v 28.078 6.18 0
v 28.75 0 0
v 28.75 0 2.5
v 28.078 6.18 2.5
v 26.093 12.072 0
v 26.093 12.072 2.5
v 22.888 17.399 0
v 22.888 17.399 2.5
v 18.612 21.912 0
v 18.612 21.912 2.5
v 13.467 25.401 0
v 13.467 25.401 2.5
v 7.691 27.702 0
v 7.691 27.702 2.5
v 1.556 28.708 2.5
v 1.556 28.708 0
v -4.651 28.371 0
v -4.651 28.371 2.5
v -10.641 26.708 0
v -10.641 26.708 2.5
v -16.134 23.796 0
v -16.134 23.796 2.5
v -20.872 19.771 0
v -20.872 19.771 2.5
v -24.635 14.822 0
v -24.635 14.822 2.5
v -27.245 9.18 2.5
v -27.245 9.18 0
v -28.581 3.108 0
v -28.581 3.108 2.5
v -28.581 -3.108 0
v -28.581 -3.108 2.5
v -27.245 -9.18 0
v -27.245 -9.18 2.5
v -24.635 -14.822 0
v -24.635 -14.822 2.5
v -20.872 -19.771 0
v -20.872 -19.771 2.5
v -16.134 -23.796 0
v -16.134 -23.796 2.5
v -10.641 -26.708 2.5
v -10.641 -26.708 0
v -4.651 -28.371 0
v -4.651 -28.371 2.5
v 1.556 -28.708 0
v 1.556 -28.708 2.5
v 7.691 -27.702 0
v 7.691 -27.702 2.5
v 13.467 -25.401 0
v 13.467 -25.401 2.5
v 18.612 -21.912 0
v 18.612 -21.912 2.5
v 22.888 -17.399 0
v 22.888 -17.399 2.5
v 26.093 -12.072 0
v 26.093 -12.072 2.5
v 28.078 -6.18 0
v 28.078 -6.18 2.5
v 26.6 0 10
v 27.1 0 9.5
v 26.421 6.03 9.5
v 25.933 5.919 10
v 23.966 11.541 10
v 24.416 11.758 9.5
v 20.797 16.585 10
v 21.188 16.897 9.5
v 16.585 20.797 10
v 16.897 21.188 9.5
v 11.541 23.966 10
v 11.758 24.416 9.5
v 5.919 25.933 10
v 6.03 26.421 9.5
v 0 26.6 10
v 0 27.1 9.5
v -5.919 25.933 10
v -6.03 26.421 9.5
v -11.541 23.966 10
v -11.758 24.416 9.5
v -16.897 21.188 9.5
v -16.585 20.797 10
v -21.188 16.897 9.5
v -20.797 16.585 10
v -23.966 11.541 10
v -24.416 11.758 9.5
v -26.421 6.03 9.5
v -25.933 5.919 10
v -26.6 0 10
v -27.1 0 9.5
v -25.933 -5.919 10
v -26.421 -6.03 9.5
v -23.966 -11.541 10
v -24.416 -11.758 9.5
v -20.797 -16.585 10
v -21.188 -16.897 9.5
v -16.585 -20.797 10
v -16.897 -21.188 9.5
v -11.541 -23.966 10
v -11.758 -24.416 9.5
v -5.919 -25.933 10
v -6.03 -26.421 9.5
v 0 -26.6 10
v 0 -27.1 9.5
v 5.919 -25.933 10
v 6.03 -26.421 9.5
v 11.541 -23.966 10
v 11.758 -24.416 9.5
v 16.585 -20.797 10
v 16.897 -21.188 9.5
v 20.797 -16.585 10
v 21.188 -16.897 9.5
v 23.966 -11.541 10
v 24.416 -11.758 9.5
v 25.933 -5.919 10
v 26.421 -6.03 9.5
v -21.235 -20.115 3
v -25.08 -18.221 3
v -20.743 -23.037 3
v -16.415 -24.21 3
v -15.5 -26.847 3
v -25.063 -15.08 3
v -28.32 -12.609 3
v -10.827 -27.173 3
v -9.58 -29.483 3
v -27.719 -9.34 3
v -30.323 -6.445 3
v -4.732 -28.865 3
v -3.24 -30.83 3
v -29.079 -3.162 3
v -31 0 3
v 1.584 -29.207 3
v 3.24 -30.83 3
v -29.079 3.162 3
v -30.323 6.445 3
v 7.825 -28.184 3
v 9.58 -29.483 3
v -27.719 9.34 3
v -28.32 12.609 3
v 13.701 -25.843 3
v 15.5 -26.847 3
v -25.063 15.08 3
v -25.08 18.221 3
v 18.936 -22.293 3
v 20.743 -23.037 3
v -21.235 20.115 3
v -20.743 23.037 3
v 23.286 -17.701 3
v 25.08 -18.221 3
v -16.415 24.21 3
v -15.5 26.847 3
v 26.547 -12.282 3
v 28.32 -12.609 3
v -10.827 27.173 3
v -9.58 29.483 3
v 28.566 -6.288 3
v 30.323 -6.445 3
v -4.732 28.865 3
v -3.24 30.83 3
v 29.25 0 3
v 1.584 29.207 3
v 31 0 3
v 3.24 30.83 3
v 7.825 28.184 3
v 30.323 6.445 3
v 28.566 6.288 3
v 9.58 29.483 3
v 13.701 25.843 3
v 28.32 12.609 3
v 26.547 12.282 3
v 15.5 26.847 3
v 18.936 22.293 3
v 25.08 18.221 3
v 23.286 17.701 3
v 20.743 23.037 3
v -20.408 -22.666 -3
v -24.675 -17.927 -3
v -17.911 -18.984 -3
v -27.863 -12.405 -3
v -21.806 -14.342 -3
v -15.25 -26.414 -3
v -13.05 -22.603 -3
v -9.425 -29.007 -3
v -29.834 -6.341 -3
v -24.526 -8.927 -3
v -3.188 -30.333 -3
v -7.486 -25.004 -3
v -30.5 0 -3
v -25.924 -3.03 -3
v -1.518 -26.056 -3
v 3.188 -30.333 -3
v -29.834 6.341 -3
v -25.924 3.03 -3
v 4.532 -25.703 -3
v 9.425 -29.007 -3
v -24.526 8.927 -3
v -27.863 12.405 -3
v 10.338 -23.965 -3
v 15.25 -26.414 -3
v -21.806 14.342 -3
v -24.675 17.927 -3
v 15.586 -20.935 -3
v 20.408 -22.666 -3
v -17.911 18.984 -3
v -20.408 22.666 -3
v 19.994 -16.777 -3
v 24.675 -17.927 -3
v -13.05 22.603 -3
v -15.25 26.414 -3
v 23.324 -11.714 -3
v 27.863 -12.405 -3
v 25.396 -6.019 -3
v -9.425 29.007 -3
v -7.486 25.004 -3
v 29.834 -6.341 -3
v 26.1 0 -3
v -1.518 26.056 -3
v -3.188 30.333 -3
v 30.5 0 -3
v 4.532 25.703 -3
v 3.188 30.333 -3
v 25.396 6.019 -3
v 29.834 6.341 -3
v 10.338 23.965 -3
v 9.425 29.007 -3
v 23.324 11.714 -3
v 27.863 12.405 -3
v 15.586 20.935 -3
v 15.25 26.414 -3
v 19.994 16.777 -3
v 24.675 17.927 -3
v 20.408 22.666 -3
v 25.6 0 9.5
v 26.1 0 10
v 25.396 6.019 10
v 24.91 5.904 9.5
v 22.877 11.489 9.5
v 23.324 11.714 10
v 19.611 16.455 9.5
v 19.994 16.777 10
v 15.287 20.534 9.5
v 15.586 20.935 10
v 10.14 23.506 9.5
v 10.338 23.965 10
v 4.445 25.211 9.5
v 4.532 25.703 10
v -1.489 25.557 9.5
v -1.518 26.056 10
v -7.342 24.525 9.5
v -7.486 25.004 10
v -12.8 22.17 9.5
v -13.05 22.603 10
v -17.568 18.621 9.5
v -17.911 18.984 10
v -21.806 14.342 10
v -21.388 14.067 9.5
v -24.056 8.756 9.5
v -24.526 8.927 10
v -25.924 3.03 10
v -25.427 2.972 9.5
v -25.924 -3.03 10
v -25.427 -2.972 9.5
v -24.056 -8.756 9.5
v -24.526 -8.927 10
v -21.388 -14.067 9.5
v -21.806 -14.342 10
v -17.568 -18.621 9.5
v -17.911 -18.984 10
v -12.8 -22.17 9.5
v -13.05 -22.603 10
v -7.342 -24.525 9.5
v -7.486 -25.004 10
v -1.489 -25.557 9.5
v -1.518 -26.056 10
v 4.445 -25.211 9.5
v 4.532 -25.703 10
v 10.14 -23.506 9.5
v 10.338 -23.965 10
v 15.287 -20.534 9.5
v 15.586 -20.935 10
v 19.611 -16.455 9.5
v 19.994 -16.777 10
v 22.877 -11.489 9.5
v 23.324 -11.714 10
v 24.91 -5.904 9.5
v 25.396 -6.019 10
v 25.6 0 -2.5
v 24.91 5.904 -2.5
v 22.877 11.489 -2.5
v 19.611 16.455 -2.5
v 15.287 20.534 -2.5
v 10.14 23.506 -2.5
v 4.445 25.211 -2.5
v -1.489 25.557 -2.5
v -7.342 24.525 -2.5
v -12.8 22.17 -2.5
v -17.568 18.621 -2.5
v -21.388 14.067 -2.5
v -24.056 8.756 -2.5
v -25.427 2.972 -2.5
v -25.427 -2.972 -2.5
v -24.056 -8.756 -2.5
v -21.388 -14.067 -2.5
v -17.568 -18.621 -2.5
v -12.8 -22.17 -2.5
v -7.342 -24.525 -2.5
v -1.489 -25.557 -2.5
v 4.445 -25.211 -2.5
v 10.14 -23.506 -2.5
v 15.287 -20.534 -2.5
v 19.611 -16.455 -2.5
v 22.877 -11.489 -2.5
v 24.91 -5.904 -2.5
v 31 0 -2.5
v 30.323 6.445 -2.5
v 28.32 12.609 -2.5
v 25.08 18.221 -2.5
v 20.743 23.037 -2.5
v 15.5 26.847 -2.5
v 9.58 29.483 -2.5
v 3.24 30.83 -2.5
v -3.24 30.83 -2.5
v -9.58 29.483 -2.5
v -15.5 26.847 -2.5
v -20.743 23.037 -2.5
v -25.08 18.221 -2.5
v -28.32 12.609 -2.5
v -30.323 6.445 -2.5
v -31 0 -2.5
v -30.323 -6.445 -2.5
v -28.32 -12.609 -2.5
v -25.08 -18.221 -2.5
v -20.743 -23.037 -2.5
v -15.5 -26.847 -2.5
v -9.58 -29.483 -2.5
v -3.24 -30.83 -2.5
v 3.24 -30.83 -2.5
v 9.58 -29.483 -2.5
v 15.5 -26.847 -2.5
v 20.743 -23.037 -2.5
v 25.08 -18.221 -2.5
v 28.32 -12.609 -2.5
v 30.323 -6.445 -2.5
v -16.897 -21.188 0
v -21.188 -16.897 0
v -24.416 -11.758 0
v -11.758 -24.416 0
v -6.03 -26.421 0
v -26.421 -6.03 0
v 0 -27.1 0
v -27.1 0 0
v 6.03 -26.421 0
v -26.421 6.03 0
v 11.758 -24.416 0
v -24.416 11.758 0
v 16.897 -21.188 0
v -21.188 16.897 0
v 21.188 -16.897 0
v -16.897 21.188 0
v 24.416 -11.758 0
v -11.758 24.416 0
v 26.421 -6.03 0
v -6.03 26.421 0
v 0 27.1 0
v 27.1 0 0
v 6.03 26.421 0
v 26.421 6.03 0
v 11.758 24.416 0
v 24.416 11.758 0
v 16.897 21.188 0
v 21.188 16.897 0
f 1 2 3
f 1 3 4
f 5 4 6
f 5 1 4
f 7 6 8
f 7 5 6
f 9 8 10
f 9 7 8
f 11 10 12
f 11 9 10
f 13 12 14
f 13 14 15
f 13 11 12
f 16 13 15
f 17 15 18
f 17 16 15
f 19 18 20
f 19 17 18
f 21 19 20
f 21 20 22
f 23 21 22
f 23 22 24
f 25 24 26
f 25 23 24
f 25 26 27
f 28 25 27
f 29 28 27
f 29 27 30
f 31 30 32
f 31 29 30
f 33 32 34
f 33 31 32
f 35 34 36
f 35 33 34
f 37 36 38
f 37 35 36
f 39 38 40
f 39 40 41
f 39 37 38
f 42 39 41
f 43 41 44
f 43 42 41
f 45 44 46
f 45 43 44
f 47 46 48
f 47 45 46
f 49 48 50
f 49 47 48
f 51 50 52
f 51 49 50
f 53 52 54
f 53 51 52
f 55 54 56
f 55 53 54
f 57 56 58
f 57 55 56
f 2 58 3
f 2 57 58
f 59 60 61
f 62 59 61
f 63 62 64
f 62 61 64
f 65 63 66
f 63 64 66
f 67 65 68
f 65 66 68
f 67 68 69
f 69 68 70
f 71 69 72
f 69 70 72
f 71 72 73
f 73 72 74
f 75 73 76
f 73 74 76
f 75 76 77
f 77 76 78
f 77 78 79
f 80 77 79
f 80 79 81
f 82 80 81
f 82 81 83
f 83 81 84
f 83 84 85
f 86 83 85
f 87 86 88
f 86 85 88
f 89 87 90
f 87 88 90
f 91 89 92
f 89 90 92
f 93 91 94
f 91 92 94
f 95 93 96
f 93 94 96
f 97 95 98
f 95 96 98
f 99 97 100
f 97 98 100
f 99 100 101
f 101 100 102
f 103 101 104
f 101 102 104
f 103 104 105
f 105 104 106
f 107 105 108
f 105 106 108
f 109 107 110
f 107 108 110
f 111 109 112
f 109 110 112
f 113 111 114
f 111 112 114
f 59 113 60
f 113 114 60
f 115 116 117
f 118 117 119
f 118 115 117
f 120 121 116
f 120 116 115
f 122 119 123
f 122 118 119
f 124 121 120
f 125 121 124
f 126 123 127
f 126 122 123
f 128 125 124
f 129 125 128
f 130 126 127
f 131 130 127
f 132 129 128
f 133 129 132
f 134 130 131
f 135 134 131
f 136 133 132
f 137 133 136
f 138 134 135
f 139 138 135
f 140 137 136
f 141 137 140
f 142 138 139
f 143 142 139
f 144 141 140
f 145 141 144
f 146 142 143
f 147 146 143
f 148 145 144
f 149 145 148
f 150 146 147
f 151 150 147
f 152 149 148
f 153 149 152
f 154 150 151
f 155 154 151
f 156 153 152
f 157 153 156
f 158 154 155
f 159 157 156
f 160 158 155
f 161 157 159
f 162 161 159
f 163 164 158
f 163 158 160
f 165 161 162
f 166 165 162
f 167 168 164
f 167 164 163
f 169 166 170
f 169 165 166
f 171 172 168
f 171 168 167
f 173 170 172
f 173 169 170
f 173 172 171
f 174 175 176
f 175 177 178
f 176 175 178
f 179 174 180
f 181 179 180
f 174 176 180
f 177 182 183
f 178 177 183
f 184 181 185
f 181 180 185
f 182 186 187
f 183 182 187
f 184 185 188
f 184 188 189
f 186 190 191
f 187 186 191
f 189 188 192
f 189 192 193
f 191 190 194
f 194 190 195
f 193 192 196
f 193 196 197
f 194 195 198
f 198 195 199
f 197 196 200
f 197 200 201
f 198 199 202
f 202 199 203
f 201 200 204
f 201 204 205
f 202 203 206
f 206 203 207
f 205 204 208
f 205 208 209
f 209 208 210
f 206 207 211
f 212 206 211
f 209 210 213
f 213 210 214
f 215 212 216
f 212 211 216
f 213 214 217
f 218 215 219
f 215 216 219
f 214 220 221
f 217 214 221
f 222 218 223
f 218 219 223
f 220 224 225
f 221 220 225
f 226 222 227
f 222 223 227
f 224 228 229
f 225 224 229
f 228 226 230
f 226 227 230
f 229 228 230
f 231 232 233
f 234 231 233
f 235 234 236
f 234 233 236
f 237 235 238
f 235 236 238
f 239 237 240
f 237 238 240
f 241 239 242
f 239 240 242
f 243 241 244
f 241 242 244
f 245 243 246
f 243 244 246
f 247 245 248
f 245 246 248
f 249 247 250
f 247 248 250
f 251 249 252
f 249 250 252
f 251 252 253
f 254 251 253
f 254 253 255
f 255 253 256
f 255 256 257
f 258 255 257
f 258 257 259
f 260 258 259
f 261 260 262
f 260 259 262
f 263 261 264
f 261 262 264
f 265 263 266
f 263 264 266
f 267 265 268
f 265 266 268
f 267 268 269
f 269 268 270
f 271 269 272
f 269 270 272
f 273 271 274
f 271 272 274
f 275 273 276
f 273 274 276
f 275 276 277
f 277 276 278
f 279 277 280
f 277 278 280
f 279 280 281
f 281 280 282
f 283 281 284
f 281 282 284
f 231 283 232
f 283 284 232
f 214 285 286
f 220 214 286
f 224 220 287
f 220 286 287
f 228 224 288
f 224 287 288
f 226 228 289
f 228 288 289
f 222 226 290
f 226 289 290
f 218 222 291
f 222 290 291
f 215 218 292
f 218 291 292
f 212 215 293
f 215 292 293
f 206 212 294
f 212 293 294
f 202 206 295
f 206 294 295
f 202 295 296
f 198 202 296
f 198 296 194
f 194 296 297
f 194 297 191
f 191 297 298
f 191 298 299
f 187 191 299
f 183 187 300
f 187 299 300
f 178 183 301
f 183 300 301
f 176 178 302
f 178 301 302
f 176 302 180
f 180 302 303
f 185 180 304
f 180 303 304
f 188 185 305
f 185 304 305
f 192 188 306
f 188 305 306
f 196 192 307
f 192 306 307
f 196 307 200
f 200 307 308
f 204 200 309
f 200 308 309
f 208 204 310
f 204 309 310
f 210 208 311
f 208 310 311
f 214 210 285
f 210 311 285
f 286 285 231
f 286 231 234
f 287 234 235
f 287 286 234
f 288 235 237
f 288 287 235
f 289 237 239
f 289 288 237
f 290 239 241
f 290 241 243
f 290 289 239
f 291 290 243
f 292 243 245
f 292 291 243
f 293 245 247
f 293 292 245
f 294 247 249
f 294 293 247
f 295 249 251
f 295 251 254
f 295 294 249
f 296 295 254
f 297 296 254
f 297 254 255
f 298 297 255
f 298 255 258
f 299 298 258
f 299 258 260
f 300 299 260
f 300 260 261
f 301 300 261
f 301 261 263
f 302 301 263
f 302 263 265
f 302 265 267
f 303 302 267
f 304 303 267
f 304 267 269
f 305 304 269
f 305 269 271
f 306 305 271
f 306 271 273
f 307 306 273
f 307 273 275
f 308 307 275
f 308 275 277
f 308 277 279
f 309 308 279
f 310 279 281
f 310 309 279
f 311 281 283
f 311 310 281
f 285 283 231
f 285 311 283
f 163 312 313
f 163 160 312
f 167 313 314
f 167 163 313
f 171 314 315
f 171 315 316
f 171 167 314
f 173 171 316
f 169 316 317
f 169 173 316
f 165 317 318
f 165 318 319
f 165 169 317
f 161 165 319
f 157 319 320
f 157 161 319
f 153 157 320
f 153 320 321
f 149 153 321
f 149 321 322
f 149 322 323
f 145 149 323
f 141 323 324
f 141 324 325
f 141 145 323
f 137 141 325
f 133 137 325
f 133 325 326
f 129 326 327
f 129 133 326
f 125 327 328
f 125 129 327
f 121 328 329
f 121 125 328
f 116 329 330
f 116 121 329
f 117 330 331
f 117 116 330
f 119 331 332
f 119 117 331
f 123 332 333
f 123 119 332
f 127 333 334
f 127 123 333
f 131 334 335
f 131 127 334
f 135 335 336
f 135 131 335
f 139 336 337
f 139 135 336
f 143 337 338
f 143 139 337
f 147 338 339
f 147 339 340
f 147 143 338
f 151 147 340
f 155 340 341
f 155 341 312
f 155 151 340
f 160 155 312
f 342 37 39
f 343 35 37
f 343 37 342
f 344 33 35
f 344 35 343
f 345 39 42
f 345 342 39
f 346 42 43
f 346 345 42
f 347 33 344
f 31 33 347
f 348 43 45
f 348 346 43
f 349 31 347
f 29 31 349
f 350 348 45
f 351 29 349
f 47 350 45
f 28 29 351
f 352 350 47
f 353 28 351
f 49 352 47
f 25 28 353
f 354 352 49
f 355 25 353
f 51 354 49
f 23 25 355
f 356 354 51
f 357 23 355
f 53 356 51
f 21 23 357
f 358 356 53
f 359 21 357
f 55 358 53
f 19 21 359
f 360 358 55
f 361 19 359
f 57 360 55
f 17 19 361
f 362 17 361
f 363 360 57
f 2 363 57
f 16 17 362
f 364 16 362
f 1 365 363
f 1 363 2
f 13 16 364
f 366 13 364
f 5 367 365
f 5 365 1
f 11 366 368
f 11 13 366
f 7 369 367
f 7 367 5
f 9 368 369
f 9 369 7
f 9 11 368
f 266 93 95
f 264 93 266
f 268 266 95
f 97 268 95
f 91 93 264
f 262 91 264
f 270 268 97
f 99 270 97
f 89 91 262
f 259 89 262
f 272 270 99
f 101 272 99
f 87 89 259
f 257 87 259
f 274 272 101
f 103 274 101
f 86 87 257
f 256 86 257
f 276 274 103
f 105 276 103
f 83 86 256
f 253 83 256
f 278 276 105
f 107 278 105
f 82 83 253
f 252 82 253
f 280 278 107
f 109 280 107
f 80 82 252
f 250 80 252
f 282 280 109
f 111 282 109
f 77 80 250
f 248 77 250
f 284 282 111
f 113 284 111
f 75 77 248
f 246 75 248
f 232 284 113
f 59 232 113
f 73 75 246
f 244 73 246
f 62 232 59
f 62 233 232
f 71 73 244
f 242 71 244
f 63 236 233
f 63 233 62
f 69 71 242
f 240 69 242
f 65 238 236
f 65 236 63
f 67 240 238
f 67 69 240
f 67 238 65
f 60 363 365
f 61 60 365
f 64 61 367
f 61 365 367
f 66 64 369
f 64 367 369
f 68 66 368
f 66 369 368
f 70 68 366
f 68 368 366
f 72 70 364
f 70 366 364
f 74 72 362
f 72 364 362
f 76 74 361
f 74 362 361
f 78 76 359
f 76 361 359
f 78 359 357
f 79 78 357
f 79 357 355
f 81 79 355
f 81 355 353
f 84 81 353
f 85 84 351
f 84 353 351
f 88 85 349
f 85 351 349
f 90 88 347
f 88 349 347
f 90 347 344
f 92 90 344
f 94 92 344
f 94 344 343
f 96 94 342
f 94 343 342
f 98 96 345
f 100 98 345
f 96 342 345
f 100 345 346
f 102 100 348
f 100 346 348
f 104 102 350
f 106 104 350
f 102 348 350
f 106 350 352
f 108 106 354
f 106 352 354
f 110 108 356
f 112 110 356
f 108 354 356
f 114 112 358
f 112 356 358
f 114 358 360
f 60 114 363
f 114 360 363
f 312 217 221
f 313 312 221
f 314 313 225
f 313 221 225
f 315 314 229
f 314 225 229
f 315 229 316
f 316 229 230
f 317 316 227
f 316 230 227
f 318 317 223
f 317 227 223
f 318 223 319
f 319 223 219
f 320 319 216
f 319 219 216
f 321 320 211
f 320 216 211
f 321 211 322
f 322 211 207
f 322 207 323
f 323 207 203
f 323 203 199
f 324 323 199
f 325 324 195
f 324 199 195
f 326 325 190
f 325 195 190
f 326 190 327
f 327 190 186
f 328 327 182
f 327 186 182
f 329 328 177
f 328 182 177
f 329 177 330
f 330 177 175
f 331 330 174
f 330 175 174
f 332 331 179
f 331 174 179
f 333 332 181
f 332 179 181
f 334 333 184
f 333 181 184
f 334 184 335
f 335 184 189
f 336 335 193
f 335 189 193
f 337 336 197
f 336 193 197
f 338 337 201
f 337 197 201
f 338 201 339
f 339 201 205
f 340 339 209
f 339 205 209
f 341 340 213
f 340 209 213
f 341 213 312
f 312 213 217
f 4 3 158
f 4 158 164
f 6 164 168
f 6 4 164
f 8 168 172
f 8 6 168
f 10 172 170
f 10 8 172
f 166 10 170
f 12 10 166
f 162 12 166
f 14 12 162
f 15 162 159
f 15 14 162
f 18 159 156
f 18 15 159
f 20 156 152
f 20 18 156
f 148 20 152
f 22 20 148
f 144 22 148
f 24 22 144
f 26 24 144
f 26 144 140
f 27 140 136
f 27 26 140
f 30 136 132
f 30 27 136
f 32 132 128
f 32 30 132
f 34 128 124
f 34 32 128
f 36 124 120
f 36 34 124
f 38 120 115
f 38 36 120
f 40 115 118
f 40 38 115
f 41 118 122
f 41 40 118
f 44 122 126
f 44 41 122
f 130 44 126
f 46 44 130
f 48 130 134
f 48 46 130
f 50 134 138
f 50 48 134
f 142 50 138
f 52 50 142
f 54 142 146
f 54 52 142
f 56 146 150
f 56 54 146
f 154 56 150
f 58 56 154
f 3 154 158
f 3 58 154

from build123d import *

# Parameters (mm, degrees)
F0_R     = 31
F0_R_2   = 28.75
F0_R_3   = 27.1
F0_R_4   = 25.6
F1_DEPTH = 3
F2_DEPTH = 10
F3_DEPTH = 3
F4_DEPTH = 25
F5_SIZE  = 0.5


with BuildPart() as f1:
    # F0 (on Top) → F1 (new body)
    with BuildSketch(Plane.XY):
        Circle(F0_R)
        Circle(F0_R_2, mode=Mode.SUBTRACT)
        Circle(F0_R_2)
        Circle(F0_R_3, mode=Mode.SUBTRACT)
        Circle(F0_R_3)
        Circle(F0_R_4, mode=Mode.SUBTRACT)
    extrude(amount=-F1_DEPTH)

    # F0 (on Top) → F2 (join)
    with BuildSketch(Plane.XY):
        Circle(F0_R_3)
        Circle(F0_R_4, mode=Mode.SUBTRACT)
    extrude(amount=F2_DEPTH)

    # F0 (on Top) → F3 (join)
    with BuildSketch(Plane.XY):
        Circle(F0_R)
        Circle(F0_R_2, mode=Mode.SUBTRACT)
    extrude(amount=F3_DEPTH)

    # F0 (on Top) → F4 (cut)
    with BuildSketch(Plane.XY):
        Circle(F0_R_4)
    extrude(amount=F4_DEPTH, mode=Mode.SUBTRACT)

    # F5
    f5_edges = [f1.edges().sort_by_distance(p)[0] for p in [
        (-25.6, 0, 10),
        (-27.1, 0, 10),
        (-28.75, 0, 3),
        (-25.6, 0, -3),
        (-31, 0, -3),
    ]]
    chamfer(f5_edges, length=F5_SIZE)


solid = f1.part
